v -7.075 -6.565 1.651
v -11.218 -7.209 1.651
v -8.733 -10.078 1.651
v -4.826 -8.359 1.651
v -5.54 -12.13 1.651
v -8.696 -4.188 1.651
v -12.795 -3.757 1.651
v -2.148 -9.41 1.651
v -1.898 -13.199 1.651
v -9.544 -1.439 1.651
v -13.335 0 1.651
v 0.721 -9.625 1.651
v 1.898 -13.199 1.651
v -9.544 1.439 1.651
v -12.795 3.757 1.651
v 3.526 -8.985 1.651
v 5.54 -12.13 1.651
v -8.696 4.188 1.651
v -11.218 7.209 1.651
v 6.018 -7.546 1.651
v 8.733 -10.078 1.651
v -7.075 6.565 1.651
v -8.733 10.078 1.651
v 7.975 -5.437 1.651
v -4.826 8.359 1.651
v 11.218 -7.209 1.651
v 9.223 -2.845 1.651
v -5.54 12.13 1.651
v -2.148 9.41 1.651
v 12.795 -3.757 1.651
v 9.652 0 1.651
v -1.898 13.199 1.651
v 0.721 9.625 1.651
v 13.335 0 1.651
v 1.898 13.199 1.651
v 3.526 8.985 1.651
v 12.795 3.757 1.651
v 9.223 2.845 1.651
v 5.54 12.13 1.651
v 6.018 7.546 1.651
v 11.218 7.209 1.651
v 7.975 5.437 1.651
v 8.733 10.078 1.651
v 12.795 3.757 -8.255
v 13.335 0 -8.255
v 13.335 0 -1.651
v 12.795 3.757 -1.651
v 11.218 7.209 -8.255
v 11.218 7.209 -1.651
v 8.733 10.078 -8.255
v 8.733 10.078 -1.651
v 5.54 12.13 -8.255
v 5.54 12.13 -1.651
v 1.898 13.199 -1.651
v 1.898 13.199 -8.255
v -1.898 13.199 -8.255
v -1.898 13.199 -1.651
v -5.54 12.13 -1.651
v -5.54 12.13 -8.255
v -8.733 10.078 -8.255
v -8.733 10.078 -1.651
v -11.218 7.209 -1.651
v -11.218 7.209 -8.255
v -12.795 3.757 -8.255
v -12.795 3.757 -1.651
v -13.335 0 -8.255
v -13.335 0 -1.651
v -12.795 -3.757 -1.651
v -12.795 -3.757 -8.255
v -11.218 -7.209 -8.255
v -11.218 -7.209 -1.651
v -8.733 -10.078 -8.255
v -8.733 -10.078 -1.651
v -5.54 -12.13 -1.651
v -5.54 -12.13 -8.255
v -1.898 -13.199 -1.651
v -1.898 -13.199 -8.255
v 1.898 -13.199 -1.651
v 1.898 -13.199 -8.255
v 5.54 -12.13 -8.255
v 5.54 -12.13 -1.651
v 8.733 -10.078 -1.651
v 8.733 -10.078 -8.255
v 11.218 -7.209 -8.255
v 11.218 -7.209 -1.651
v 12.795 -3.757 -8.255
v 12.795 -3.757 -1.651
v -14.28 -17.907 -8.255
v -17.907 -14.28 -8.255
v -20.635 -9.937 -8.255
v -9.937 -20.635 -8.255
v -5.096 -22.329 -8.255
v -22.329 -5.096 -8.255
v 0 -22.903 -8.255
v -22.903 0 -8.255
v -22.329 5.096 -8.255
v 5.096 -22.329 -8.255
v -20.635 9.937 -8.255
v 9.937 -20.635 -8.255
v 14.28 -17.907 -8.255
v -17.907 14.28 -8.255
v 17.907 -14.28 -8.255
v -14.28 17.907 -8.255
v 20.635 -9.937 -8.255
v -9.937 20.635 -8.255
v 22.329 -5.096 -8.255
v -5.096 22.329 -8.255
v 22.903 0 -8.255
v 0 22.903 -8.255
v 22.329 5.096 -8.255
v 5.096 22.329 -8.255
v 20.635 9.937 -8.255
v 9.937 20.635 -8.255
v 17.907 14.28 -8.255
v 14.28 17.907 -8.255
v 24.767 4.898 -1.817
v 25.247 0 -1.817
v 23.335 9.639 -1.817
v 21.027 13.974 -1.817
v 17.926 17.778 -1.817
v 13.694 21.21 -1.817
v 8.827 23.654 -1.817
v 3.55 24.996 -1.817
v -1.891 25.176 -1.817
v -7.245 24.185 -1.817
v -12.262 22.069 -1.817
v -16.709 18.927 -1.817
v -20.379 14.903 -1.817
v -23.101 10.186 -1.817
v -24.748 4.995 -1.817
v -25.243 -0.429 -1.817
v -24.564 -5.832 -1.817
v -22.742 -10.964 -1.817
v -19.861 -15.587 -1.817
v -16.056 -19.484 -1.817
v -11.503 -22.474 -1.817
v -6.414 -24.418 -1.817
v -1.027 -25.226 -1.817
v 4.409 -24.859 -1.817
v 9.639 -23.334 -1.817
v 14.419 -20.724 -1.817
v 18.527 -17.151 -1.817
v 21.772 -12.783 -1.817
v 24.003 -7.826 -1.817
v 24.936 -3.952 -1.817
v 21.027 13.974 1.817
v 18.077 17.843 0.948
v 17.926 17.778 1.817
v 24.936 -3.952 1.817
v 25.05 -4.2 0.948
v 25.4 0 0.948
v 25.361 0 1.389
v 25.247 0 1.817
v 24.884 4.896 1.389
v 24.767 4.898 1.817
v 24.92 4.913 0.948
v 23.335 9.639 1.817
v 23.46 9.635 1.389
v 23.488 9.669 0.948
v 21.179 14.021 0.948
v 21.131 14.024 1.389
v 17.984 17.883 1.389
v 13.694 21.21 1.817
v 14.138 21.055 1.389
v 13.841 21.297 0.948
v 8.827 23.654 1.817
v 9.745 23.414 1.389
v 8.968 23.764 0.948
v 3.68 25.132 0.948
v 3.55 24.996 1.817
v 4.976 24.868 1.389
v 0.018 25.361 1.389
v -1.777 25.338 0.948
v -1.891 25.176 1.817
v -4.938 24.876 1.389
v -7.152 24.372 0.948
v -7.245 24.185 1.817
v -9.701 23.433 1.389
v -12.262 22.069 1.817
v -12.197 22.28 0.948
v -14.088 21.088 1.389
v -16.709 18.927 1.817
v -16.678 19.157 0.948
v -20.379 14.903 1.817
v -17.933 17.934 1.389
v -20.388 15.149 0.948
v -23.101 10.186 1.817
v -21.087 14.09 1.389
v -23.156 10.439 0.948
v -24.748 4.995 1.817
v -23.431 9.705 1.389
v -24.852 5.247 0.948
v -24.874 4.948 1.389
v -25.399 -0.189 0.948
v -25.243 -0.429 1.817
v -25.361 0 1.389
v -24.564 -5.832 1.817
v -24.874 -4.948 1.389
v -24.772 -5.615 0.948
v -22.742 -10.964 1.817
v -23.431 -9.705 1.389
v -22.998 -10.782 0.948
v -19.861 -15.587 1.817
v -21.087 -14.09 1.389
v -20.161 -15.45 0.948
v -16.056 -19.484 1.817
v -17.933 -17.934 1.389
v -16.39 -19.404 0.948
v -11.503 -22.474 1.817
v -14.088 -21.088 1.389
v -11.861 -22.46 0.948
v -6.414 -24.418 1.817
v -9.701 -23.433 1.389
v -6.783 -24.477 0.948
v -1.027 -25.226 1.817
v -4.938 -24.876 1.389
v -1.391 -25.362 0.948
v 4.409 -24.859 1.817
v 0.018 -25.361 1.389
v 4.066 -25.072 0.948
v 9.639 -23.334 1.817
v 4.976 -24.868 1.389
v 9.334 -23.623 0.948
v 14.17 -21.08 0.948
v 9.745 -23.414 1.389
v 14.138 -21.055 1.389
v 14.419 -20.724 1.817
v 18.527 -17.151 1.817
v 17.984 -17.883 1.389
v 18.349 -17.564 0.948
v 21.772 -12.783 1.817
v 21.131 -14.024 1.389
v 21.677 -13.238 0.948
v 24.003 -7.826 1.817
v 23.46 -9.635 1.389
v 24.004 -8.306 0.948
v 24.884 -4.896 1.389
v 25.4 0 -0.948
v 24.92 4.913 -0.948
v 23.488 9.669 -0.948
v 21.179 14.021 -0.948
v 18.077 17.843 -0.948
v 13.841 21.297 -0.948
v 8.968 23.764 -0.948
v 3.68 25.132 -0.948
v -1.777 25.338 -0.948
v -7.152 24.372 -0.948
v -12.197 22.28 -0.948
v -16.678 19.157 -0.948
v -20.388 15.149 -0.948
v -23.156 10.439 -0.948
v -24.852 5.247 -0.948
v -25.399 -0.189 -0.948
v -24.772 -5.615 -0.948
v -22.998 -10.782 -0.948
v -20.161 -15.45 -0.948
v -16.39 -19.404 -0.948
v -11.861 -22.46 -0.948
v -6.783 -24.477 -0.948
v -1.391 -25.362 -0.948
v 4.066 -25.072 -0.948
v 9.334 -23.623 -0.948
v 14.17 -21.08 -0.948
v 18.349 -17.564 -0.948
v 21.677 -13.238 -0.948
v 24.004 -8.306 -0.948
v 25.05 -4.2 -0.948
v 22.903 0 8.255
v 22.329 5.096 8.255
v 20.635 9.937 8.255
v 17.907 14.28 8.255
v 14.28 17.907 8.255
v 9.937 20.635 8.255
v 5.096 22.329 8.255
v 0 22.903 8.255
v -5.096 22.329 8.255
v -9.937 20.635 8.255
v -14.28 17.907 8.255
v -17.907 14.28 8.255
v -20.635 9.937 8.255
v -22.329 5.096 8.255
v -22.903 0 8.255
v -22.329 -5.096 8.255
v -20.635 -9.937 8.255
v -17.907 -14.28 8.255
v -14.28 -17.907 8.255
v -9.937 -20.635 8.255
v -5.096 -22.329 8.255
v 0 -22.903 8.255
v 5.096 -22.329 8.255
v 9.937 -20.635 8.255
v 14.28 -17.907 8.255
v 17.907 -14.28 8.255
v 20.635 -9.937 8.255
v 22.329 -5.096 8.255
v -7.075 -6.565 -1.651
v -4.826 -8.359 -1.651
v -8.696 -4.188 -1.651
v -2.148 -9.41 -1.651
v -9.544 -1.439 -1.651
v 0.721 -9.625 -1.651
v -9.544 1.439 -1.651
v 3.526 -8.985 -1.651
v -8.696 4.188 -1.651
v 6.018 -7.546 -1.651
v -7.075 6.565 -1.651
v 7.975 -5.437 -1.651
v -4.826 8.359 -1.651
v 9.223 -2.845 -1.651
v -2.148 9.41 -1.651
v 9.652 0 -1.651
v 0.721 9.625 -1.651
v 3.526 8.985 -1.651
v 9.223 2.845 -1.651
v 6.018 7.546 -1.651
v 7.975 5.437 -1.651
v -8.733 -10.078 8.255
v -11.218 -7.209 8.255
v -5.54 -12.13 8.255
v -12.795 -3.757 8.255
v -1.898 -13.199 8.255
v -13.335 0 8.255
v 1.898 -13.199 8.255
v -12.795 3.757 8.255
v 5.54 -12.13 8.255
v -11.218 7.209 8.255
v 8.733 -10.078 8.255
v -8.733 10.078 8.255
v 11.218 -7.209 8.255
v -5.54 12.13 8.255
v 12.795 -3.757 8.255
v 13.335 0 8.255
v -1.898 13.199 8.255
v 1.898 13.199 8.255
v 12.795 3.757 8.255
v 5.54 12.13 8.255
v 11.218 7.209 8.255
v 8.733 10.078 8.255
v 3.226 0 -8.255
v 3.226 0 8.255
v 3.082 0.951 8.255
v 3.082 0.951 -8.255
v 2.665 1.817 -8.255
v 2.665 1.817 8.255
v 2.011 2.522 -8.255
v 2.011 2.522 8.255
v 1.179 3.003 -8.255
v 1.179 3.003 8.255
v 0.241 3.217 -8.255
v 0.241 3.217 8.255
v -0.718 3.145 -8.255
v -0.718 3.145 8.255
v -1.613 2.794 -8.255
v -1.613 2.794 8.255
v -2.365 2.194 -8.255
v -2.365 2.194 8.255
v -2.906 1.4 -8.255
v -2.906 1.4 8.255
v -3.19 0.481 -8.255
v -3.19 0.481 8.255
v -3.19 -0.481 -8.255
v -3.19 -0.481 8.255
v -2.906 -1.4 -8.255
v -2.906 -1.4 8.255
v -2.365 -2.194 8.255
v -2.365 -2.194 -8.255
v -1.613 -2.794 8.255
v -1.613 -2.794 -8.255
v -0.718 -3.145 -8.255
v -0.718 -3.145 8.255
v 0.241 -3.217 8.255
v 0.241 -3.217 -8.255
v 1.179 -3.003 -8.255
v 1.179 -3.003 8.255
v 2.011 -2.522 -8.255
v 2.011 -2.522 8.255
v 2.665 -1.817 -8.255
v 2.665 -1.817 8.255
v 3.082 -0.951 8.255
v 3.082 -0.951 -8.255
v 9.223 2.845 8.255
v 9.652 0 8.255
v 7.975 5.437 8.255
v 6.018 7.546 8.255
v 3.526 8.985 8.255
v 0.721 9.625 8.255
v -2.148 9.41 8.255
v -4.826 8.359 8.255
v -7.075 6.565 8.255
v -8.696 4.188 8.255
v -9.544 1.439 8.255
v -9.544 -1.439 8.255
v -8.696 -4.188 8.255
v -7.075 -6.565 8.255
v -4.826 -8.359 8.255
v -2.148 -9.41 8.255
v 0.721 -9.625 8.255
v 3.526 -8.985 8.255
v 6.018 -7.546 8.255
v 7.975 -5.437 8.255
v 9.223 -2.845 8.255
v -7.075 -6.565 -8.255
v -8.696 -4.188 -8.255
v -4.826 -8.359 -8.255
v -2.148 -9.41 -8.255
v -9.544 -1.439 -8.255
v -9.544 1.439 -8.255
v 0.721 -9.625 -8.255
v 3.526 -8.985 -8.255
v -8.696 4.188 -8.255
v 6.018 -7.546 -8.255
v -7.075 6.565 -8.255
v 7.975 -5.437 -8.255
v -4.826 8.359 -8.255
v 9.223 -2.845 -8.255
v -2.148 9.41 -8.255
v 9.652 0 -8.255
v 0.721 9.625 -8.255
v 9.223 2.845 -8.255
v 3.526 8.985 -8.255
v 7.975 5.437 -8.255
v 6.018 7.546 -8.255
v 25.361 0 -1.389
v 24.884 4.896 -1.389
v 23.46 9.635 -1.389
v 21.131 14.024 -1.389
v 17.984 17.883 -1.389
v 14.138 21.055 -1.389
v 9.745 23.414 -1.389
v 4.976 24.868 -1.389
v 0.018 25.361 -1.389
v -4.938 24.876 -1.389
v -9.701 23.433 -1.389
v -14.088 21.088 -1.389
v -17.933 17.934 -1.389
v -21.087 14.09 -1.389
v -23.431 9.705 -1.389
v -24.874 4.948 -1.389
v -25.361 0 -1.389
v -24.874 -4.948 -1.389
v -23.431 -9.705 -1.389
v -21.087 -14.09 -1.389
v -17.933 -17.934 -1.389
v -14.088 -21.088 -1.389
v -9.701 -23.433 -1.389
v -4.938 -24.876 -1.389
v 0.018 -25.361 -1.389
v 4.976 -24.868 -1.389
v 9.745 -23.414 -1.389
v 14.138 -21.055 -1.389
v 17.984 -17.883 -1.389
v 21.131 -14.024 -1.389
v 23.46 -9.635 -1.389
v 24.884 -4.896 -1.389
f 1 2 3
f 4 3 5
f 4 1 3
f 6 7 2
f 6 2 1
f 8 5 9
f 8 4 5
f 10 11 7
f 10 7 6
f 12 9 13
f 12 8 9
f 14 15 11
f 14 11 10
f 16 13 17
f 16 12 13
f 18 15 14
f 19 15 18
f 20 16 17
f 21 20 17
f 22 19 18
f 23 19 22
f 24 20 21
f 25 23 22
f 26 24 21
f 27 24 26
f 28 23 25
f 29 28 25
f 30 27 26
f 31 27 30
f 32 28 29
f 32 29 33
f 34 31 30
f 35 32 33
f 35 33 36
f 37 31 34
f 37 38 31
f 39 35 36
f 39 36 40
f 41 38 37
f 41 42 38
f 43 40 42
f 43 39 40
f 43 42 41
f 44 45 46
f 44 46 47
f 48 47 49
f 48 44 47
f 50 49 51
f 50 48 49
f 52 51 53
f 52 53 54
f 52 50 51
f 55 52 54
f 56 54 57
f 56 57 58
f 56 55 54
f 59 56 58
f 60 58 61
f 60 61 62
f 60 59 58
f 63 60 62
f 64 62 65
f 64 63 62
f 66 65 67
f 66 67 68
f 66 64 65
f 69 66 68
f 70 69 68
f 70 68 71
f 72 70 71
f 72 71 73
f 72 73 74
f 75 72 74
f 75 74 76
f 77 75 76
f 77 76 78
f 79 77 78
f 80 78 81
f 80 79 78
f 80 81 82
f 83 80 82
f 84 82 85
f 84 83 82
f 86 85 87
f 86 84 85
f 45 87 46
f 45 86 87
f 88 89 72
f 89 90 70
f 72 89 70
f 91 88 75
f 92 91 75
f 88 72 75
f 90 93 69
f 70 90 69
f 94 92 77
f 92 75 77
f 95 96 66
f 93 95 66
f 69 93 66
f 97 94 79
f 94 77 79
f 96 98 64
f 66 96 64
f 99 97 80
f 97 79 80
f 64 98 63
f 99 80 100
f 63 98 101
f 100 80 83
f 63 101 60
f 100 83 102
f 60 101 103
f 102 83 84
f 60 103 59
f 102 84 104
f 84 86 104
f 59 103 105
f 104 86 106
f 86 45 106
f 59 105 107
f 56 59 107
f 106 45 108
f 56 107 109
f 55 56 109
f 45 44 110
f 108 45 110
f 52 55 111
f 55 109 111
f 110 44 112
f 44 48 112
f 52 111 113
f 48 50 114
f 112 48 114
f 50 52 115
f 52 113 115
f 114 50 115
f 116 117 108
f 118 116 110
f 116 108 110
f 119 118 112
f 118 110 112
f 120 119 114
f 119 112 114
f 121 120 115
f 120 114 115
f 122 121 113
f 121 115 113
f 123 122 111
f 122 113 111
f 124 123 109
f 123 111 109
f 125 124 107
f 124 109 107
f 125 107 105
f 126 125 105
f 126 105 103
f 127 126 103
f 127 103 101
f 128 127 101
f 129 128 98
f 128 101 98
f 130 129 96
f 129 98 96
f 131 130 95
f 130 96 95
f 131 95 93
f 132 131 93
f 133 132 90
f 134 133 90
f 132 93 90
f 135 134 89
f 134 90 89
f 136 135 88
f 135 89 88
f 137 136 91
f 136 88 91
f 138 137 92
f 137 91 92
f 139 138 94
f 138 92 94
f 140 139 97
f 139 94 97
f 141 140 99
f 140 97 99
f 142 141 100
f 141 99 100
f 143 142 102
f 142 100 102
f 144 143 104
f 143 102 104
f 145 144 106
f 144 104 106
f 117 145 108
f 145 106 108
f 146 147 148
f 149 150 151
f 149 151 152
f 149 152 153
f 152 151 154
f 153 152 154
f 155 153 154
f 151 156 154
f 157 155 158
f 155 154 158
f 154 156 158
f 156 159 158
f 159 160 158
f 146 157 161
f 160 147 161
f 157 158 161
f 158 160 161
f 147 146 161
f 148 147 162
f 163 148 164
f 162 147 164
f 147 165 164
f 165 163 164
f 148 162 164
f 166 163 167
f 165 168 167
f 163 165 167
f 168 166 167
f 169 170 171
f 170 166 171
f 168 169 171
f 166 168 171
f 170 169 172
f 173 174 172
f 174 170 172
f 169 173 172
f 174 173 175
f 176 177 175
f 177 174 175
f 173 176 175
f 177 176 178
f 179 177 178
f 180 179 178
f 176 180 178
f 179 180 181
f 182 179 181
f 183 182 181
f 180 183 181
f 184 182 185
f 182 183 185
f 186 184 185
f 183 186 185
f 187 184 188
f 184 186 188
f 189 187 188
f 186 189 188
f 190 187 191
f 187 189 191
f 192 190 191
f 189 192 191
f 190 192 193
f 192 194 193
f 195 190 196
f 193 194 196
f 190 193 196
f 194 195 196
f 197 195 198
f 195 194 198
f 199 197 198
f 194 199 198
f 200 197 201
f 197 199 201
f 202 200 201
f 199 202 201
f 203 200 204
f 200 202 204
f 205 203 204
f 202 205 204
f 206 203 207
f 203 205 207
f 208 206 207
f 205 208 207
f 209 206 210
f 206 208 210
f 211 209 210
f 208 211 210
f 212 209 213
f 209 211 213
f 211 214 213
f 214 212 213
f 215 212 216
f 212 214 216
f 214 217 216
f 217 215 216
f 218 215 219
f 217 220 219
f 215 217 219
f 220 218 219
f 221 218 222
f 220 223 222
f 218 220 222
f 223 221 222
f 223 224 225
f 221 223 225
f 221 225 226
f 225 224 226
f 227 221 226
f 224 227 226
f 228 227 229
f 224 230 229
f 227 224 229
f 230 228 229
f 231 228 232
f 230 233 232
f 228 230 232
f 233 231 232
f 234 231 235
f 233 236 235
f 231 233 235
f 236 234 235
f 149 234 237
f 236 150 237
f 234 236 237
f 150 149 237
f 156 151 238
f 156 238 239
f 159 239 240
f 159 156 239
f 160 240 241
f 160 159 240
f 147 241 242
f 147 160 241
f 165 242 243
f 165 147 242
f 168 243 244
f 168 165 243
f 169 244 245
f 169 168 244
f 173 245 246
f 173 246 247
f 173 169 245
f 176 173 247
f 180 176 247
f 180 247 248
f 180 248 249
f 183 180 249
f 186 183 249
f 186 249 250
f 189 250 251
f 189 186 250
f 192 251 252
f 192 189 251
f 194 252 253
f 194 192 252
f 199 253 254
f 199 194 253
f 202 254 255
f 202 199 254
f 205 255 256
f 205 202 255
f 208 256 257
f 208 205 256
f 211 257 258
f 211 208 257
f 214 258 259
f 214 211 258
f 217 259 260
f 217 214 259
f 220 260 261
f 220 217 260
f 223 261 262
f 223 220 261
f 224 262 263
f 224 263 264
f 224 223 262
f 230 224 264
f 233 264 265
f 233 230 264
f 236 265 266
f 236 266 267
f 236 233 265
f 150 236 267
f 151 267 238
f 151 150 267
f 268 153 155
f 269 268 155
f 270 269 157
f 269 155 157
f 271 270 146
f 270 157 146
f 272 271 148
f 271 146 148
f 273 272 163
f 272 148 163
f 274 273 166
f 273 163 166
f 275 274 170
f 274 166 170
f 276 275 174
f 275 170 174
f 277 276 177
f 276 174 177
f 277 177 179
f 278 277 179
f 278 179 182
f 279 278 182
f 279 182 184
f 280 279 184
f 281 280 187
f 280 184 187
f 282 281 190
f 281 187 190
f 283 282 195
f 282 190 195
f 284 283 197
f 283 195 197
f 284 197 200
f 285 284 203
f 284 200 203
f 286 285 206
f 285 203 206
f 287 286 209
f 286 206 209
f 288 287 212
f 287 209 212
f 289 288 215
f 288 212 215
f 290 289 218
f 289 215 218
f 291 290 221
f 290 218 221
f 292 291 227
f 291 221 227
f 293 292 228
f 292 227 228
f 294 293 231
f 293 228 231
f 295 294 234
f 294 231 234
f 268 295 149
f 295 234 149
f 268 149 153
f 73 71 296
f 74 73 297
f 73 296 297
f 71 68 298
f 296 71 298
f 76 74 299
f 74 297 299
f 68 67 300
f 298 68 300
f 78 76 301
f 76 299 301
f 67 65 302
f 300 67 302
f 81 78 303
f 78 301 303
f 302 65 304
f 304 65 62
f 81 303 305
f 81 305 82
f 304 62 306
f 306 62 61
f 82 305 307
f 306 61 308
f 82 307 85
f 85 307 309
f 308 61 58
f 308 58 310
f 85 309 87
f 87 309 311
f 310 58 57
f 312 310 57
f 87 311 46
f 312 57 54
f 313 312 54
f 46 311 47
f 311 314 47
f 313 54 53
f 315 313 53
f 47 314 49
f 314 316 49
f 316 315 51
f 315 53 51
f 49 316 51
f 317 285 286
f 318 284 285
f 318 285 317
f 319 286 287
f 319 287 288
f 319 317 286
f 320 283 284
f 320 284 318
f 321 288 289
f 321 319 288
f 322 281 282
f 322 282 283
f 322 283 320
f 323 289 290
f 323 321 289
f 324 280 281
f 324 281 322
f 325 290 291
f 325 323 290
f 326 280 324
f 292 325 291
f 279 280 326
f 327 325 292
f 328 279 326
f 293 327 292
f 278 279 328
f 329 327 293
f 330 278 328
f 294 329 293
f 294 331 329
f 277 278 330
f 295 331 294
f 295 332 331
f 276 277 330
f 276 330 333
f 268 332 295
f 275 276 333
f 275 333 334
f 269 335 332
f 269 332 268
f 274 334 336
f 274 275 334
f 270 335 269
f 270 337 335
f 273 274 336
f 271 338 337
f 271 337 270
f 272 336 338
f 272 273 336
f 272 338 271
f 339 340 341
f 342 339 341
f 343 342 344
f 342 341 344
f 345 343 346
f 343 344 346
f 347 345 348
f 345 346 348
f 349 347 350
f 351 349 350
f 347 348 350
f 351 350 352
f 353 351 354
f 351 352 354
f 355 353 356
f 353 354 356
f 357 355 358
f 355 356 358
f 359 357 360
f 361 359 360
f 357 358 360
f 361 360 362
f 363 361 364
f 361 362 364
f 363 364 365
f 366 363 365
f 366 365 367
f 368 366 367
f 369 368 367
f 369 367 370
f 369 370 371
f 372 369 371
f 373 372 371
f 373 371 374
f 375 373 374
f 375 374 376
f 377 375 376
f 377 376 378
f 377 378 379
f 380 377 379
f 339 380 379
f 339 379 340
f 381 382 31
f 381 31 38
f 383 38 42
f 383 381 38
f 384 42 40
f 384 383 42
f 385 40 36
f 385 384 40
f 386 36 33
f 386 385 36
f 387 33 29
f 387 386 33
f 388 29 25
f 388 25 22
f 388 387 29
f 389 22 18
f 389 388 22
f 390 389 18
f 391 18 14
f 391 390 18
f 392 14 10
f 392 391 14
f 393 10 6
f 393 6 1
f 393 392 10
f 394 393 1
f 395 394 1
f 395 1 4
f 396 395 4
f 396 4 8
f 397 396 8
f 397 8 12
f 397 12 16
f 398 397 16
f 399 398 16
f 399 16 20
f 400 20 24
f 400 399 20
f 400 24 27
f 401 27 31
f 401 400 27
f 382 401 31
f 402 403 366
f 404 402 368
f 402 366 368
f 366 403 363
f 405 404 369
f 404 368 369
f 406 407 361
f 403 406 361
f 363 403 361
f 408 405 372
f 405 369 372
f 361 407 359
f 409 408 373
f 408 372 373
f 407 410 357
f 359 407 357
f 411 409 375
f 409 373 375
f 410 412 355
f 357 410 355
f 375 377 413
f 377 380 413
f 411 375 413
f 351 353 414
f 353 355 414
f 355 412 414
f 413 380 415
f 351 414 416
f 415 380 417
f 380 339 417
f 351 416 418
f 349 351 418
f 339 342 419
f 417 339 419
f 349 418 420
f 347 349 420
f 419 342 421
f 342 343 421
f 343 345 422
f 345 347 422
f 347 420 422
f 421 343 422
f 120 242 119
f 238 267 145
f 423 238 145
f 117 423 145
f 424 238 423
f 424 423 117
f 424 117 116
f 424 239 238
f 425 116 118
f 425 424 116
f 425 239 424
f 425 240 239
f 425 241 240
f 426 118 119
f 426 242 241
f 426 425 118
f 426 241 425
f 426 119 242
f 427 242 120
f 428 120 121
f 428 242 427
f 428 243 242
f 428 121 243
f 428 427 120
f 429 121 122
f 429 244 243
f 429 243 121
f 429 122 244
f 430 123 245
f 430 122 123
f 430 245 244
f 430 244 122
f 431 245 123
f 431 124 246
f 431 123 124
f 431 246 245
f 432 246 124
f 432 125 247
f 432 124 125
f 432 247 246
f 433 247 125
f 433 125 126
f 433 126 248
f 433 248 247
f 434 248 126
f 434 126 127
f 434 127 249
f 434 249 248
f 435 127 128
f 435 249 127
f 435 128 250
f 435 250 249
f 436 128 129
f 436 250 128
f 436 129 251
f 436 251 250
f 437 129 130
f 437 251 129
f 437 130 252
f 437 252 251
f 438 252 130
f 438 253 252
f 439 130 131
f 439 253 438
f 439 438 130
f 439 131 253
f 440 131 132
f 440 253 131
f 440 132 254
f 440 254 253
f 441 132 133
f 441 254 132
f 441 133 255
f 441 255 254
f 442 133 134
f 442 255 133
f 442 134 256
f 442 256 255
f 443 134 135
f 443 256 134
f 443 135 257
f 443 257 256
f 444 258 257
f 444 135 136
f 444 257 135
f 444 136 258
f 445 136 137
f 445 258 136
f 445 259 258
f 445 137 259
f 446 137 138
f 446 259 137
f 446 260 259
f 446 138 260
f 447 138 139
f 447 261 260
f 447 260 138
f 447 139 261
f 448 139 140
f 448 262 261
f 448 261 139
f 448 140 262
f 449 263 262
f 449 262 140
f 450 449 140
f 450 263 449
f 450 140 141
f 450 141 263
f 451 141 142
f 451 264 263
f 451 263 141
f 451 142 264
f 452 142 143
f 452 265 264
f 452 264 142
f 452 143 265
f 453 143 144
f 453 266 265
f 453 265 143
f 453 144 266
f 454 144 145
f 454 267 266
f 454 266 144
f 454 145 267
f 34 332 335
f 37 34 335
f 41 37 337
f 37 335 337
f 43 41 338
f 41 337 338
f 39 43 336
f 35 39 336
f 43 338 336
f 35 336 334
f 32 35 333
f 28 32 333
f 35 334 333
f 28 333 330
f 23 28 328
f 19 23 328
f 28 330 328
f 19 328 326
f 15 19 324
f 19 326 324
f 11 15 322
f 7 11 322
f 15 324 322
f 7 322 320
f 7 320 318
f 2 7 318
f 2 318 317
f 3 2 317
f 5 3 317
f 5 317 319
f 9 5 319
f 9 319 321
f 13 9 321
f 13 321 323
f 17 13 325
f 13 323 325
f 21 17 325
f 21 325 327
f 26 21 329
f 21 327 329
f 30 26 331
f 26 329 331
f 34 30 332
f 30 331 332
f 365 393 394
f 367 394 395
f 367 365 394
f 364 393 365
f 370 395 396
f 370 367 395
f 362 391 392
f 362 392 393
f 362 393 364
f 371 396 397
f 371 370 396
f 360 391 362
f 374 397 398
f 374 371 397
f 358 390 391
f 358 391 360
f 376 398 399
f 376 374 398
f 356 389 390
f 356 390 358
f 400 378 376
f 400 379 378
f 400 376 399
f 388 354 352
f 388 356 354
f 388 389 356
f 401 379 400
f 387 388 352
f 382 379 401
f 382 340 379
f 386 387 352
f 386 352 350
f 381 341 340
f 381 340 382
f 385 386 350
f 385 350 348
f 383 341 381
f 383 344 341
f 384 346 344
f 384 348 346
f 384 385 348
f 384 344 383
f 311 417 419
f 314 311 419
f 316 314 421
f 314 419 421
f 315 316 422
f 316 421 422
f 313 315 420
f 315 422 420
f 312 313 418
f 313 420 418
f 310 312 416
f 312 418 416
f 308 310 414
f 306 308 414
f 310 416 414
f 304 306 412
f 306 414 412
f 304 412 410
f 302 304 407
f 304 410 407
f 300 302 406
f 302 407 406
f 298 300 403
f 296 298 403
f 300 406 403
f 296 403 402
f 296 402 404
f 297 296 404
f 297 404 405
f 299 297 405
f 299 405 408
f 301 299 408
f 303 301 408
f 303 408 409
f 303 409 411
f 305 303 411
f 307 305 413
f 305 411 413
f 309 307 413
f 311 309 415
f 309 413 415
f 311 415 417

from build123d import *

# Parameters (mm, degrees)
SKETCH1_R           = 25.4
BOSS_EXTRUDE1_DEPTH = 8.255
FILLET1_R           = 2.54
SKETCH3_R           = 3.2258
CUT_EXTRUDE1_DEPTH  = 40.533531954
SKETCH4_R           = 13.335
SKETCH4_R_2         = 9.652
CUT_EXTRUDE2_DEPTH  = 6.604


# Read off the part's stored shape, not the designer's step: Cut-Revolve-Thin6
with BuildPart() as part:
    # Sketch1 → Boss-Extrude1 (new, symmetric)
    with BuildSketch(Plane.XY):
        Circle(SKETCH1_R)
    extrude(amount=BOSS_EXTRUDE1_DEPTH, both=True)

    # Cut-Revolve-Thin6 outline → Cut-Revolve-Thin6 (revolve, cut)
    with BuildSketch(Plane.XZ):
        Polygon((25.4, 8.255), (22.903425716, 8.255), (25.4, 1.395718529), align=None)
        Polygon((25.4, -8.255), (25.4, -1.395718529), (22.903425716, -8.255), align=None)
    revolve(axis=Axis((0, 0, 0), (0, 0, 1)), mode=Mode.SUBTRACT)

    # Fillet1
    fillet1_edges = [part.edges().sort_by_distance(p)[0] for p in [
        (-25.4, 0, -1.395718529),
        (-25.4, 0, 1.395718529),
    ]]
    fillet(fillet1_edges, radius=FILLET1_R)

    # Sketch3 → Cut-Extrude1 (cut, through all)
    with BuildSketch(Plane.XY.offset(8.255)):
        Circle(SKETCH3_R)
    extrude(amount=-CUT_EXTRUDE1_DEPTH, mode=Mode.SUBTRACT)

    # Sketch4 → Cut-Extrude2 (cut)
    with BuildSketch(Plane.XY.offset(8.255)):
        Circle(SKETCH4_R)
        Circle(SKETCH4_R_2, mode=Mode.SUBTRACT)
    cut_extrude2 = extrude(amount=-CUT_EXTRUDE2_DEPTH, mode=Mode.SUBTRACT)

    # Mirror1: Cut-Extrude2 across plane
    add(cut_extrude2.mirror(Plane.XY), mode=Mode.SUBTRACT)


solid = part.part
